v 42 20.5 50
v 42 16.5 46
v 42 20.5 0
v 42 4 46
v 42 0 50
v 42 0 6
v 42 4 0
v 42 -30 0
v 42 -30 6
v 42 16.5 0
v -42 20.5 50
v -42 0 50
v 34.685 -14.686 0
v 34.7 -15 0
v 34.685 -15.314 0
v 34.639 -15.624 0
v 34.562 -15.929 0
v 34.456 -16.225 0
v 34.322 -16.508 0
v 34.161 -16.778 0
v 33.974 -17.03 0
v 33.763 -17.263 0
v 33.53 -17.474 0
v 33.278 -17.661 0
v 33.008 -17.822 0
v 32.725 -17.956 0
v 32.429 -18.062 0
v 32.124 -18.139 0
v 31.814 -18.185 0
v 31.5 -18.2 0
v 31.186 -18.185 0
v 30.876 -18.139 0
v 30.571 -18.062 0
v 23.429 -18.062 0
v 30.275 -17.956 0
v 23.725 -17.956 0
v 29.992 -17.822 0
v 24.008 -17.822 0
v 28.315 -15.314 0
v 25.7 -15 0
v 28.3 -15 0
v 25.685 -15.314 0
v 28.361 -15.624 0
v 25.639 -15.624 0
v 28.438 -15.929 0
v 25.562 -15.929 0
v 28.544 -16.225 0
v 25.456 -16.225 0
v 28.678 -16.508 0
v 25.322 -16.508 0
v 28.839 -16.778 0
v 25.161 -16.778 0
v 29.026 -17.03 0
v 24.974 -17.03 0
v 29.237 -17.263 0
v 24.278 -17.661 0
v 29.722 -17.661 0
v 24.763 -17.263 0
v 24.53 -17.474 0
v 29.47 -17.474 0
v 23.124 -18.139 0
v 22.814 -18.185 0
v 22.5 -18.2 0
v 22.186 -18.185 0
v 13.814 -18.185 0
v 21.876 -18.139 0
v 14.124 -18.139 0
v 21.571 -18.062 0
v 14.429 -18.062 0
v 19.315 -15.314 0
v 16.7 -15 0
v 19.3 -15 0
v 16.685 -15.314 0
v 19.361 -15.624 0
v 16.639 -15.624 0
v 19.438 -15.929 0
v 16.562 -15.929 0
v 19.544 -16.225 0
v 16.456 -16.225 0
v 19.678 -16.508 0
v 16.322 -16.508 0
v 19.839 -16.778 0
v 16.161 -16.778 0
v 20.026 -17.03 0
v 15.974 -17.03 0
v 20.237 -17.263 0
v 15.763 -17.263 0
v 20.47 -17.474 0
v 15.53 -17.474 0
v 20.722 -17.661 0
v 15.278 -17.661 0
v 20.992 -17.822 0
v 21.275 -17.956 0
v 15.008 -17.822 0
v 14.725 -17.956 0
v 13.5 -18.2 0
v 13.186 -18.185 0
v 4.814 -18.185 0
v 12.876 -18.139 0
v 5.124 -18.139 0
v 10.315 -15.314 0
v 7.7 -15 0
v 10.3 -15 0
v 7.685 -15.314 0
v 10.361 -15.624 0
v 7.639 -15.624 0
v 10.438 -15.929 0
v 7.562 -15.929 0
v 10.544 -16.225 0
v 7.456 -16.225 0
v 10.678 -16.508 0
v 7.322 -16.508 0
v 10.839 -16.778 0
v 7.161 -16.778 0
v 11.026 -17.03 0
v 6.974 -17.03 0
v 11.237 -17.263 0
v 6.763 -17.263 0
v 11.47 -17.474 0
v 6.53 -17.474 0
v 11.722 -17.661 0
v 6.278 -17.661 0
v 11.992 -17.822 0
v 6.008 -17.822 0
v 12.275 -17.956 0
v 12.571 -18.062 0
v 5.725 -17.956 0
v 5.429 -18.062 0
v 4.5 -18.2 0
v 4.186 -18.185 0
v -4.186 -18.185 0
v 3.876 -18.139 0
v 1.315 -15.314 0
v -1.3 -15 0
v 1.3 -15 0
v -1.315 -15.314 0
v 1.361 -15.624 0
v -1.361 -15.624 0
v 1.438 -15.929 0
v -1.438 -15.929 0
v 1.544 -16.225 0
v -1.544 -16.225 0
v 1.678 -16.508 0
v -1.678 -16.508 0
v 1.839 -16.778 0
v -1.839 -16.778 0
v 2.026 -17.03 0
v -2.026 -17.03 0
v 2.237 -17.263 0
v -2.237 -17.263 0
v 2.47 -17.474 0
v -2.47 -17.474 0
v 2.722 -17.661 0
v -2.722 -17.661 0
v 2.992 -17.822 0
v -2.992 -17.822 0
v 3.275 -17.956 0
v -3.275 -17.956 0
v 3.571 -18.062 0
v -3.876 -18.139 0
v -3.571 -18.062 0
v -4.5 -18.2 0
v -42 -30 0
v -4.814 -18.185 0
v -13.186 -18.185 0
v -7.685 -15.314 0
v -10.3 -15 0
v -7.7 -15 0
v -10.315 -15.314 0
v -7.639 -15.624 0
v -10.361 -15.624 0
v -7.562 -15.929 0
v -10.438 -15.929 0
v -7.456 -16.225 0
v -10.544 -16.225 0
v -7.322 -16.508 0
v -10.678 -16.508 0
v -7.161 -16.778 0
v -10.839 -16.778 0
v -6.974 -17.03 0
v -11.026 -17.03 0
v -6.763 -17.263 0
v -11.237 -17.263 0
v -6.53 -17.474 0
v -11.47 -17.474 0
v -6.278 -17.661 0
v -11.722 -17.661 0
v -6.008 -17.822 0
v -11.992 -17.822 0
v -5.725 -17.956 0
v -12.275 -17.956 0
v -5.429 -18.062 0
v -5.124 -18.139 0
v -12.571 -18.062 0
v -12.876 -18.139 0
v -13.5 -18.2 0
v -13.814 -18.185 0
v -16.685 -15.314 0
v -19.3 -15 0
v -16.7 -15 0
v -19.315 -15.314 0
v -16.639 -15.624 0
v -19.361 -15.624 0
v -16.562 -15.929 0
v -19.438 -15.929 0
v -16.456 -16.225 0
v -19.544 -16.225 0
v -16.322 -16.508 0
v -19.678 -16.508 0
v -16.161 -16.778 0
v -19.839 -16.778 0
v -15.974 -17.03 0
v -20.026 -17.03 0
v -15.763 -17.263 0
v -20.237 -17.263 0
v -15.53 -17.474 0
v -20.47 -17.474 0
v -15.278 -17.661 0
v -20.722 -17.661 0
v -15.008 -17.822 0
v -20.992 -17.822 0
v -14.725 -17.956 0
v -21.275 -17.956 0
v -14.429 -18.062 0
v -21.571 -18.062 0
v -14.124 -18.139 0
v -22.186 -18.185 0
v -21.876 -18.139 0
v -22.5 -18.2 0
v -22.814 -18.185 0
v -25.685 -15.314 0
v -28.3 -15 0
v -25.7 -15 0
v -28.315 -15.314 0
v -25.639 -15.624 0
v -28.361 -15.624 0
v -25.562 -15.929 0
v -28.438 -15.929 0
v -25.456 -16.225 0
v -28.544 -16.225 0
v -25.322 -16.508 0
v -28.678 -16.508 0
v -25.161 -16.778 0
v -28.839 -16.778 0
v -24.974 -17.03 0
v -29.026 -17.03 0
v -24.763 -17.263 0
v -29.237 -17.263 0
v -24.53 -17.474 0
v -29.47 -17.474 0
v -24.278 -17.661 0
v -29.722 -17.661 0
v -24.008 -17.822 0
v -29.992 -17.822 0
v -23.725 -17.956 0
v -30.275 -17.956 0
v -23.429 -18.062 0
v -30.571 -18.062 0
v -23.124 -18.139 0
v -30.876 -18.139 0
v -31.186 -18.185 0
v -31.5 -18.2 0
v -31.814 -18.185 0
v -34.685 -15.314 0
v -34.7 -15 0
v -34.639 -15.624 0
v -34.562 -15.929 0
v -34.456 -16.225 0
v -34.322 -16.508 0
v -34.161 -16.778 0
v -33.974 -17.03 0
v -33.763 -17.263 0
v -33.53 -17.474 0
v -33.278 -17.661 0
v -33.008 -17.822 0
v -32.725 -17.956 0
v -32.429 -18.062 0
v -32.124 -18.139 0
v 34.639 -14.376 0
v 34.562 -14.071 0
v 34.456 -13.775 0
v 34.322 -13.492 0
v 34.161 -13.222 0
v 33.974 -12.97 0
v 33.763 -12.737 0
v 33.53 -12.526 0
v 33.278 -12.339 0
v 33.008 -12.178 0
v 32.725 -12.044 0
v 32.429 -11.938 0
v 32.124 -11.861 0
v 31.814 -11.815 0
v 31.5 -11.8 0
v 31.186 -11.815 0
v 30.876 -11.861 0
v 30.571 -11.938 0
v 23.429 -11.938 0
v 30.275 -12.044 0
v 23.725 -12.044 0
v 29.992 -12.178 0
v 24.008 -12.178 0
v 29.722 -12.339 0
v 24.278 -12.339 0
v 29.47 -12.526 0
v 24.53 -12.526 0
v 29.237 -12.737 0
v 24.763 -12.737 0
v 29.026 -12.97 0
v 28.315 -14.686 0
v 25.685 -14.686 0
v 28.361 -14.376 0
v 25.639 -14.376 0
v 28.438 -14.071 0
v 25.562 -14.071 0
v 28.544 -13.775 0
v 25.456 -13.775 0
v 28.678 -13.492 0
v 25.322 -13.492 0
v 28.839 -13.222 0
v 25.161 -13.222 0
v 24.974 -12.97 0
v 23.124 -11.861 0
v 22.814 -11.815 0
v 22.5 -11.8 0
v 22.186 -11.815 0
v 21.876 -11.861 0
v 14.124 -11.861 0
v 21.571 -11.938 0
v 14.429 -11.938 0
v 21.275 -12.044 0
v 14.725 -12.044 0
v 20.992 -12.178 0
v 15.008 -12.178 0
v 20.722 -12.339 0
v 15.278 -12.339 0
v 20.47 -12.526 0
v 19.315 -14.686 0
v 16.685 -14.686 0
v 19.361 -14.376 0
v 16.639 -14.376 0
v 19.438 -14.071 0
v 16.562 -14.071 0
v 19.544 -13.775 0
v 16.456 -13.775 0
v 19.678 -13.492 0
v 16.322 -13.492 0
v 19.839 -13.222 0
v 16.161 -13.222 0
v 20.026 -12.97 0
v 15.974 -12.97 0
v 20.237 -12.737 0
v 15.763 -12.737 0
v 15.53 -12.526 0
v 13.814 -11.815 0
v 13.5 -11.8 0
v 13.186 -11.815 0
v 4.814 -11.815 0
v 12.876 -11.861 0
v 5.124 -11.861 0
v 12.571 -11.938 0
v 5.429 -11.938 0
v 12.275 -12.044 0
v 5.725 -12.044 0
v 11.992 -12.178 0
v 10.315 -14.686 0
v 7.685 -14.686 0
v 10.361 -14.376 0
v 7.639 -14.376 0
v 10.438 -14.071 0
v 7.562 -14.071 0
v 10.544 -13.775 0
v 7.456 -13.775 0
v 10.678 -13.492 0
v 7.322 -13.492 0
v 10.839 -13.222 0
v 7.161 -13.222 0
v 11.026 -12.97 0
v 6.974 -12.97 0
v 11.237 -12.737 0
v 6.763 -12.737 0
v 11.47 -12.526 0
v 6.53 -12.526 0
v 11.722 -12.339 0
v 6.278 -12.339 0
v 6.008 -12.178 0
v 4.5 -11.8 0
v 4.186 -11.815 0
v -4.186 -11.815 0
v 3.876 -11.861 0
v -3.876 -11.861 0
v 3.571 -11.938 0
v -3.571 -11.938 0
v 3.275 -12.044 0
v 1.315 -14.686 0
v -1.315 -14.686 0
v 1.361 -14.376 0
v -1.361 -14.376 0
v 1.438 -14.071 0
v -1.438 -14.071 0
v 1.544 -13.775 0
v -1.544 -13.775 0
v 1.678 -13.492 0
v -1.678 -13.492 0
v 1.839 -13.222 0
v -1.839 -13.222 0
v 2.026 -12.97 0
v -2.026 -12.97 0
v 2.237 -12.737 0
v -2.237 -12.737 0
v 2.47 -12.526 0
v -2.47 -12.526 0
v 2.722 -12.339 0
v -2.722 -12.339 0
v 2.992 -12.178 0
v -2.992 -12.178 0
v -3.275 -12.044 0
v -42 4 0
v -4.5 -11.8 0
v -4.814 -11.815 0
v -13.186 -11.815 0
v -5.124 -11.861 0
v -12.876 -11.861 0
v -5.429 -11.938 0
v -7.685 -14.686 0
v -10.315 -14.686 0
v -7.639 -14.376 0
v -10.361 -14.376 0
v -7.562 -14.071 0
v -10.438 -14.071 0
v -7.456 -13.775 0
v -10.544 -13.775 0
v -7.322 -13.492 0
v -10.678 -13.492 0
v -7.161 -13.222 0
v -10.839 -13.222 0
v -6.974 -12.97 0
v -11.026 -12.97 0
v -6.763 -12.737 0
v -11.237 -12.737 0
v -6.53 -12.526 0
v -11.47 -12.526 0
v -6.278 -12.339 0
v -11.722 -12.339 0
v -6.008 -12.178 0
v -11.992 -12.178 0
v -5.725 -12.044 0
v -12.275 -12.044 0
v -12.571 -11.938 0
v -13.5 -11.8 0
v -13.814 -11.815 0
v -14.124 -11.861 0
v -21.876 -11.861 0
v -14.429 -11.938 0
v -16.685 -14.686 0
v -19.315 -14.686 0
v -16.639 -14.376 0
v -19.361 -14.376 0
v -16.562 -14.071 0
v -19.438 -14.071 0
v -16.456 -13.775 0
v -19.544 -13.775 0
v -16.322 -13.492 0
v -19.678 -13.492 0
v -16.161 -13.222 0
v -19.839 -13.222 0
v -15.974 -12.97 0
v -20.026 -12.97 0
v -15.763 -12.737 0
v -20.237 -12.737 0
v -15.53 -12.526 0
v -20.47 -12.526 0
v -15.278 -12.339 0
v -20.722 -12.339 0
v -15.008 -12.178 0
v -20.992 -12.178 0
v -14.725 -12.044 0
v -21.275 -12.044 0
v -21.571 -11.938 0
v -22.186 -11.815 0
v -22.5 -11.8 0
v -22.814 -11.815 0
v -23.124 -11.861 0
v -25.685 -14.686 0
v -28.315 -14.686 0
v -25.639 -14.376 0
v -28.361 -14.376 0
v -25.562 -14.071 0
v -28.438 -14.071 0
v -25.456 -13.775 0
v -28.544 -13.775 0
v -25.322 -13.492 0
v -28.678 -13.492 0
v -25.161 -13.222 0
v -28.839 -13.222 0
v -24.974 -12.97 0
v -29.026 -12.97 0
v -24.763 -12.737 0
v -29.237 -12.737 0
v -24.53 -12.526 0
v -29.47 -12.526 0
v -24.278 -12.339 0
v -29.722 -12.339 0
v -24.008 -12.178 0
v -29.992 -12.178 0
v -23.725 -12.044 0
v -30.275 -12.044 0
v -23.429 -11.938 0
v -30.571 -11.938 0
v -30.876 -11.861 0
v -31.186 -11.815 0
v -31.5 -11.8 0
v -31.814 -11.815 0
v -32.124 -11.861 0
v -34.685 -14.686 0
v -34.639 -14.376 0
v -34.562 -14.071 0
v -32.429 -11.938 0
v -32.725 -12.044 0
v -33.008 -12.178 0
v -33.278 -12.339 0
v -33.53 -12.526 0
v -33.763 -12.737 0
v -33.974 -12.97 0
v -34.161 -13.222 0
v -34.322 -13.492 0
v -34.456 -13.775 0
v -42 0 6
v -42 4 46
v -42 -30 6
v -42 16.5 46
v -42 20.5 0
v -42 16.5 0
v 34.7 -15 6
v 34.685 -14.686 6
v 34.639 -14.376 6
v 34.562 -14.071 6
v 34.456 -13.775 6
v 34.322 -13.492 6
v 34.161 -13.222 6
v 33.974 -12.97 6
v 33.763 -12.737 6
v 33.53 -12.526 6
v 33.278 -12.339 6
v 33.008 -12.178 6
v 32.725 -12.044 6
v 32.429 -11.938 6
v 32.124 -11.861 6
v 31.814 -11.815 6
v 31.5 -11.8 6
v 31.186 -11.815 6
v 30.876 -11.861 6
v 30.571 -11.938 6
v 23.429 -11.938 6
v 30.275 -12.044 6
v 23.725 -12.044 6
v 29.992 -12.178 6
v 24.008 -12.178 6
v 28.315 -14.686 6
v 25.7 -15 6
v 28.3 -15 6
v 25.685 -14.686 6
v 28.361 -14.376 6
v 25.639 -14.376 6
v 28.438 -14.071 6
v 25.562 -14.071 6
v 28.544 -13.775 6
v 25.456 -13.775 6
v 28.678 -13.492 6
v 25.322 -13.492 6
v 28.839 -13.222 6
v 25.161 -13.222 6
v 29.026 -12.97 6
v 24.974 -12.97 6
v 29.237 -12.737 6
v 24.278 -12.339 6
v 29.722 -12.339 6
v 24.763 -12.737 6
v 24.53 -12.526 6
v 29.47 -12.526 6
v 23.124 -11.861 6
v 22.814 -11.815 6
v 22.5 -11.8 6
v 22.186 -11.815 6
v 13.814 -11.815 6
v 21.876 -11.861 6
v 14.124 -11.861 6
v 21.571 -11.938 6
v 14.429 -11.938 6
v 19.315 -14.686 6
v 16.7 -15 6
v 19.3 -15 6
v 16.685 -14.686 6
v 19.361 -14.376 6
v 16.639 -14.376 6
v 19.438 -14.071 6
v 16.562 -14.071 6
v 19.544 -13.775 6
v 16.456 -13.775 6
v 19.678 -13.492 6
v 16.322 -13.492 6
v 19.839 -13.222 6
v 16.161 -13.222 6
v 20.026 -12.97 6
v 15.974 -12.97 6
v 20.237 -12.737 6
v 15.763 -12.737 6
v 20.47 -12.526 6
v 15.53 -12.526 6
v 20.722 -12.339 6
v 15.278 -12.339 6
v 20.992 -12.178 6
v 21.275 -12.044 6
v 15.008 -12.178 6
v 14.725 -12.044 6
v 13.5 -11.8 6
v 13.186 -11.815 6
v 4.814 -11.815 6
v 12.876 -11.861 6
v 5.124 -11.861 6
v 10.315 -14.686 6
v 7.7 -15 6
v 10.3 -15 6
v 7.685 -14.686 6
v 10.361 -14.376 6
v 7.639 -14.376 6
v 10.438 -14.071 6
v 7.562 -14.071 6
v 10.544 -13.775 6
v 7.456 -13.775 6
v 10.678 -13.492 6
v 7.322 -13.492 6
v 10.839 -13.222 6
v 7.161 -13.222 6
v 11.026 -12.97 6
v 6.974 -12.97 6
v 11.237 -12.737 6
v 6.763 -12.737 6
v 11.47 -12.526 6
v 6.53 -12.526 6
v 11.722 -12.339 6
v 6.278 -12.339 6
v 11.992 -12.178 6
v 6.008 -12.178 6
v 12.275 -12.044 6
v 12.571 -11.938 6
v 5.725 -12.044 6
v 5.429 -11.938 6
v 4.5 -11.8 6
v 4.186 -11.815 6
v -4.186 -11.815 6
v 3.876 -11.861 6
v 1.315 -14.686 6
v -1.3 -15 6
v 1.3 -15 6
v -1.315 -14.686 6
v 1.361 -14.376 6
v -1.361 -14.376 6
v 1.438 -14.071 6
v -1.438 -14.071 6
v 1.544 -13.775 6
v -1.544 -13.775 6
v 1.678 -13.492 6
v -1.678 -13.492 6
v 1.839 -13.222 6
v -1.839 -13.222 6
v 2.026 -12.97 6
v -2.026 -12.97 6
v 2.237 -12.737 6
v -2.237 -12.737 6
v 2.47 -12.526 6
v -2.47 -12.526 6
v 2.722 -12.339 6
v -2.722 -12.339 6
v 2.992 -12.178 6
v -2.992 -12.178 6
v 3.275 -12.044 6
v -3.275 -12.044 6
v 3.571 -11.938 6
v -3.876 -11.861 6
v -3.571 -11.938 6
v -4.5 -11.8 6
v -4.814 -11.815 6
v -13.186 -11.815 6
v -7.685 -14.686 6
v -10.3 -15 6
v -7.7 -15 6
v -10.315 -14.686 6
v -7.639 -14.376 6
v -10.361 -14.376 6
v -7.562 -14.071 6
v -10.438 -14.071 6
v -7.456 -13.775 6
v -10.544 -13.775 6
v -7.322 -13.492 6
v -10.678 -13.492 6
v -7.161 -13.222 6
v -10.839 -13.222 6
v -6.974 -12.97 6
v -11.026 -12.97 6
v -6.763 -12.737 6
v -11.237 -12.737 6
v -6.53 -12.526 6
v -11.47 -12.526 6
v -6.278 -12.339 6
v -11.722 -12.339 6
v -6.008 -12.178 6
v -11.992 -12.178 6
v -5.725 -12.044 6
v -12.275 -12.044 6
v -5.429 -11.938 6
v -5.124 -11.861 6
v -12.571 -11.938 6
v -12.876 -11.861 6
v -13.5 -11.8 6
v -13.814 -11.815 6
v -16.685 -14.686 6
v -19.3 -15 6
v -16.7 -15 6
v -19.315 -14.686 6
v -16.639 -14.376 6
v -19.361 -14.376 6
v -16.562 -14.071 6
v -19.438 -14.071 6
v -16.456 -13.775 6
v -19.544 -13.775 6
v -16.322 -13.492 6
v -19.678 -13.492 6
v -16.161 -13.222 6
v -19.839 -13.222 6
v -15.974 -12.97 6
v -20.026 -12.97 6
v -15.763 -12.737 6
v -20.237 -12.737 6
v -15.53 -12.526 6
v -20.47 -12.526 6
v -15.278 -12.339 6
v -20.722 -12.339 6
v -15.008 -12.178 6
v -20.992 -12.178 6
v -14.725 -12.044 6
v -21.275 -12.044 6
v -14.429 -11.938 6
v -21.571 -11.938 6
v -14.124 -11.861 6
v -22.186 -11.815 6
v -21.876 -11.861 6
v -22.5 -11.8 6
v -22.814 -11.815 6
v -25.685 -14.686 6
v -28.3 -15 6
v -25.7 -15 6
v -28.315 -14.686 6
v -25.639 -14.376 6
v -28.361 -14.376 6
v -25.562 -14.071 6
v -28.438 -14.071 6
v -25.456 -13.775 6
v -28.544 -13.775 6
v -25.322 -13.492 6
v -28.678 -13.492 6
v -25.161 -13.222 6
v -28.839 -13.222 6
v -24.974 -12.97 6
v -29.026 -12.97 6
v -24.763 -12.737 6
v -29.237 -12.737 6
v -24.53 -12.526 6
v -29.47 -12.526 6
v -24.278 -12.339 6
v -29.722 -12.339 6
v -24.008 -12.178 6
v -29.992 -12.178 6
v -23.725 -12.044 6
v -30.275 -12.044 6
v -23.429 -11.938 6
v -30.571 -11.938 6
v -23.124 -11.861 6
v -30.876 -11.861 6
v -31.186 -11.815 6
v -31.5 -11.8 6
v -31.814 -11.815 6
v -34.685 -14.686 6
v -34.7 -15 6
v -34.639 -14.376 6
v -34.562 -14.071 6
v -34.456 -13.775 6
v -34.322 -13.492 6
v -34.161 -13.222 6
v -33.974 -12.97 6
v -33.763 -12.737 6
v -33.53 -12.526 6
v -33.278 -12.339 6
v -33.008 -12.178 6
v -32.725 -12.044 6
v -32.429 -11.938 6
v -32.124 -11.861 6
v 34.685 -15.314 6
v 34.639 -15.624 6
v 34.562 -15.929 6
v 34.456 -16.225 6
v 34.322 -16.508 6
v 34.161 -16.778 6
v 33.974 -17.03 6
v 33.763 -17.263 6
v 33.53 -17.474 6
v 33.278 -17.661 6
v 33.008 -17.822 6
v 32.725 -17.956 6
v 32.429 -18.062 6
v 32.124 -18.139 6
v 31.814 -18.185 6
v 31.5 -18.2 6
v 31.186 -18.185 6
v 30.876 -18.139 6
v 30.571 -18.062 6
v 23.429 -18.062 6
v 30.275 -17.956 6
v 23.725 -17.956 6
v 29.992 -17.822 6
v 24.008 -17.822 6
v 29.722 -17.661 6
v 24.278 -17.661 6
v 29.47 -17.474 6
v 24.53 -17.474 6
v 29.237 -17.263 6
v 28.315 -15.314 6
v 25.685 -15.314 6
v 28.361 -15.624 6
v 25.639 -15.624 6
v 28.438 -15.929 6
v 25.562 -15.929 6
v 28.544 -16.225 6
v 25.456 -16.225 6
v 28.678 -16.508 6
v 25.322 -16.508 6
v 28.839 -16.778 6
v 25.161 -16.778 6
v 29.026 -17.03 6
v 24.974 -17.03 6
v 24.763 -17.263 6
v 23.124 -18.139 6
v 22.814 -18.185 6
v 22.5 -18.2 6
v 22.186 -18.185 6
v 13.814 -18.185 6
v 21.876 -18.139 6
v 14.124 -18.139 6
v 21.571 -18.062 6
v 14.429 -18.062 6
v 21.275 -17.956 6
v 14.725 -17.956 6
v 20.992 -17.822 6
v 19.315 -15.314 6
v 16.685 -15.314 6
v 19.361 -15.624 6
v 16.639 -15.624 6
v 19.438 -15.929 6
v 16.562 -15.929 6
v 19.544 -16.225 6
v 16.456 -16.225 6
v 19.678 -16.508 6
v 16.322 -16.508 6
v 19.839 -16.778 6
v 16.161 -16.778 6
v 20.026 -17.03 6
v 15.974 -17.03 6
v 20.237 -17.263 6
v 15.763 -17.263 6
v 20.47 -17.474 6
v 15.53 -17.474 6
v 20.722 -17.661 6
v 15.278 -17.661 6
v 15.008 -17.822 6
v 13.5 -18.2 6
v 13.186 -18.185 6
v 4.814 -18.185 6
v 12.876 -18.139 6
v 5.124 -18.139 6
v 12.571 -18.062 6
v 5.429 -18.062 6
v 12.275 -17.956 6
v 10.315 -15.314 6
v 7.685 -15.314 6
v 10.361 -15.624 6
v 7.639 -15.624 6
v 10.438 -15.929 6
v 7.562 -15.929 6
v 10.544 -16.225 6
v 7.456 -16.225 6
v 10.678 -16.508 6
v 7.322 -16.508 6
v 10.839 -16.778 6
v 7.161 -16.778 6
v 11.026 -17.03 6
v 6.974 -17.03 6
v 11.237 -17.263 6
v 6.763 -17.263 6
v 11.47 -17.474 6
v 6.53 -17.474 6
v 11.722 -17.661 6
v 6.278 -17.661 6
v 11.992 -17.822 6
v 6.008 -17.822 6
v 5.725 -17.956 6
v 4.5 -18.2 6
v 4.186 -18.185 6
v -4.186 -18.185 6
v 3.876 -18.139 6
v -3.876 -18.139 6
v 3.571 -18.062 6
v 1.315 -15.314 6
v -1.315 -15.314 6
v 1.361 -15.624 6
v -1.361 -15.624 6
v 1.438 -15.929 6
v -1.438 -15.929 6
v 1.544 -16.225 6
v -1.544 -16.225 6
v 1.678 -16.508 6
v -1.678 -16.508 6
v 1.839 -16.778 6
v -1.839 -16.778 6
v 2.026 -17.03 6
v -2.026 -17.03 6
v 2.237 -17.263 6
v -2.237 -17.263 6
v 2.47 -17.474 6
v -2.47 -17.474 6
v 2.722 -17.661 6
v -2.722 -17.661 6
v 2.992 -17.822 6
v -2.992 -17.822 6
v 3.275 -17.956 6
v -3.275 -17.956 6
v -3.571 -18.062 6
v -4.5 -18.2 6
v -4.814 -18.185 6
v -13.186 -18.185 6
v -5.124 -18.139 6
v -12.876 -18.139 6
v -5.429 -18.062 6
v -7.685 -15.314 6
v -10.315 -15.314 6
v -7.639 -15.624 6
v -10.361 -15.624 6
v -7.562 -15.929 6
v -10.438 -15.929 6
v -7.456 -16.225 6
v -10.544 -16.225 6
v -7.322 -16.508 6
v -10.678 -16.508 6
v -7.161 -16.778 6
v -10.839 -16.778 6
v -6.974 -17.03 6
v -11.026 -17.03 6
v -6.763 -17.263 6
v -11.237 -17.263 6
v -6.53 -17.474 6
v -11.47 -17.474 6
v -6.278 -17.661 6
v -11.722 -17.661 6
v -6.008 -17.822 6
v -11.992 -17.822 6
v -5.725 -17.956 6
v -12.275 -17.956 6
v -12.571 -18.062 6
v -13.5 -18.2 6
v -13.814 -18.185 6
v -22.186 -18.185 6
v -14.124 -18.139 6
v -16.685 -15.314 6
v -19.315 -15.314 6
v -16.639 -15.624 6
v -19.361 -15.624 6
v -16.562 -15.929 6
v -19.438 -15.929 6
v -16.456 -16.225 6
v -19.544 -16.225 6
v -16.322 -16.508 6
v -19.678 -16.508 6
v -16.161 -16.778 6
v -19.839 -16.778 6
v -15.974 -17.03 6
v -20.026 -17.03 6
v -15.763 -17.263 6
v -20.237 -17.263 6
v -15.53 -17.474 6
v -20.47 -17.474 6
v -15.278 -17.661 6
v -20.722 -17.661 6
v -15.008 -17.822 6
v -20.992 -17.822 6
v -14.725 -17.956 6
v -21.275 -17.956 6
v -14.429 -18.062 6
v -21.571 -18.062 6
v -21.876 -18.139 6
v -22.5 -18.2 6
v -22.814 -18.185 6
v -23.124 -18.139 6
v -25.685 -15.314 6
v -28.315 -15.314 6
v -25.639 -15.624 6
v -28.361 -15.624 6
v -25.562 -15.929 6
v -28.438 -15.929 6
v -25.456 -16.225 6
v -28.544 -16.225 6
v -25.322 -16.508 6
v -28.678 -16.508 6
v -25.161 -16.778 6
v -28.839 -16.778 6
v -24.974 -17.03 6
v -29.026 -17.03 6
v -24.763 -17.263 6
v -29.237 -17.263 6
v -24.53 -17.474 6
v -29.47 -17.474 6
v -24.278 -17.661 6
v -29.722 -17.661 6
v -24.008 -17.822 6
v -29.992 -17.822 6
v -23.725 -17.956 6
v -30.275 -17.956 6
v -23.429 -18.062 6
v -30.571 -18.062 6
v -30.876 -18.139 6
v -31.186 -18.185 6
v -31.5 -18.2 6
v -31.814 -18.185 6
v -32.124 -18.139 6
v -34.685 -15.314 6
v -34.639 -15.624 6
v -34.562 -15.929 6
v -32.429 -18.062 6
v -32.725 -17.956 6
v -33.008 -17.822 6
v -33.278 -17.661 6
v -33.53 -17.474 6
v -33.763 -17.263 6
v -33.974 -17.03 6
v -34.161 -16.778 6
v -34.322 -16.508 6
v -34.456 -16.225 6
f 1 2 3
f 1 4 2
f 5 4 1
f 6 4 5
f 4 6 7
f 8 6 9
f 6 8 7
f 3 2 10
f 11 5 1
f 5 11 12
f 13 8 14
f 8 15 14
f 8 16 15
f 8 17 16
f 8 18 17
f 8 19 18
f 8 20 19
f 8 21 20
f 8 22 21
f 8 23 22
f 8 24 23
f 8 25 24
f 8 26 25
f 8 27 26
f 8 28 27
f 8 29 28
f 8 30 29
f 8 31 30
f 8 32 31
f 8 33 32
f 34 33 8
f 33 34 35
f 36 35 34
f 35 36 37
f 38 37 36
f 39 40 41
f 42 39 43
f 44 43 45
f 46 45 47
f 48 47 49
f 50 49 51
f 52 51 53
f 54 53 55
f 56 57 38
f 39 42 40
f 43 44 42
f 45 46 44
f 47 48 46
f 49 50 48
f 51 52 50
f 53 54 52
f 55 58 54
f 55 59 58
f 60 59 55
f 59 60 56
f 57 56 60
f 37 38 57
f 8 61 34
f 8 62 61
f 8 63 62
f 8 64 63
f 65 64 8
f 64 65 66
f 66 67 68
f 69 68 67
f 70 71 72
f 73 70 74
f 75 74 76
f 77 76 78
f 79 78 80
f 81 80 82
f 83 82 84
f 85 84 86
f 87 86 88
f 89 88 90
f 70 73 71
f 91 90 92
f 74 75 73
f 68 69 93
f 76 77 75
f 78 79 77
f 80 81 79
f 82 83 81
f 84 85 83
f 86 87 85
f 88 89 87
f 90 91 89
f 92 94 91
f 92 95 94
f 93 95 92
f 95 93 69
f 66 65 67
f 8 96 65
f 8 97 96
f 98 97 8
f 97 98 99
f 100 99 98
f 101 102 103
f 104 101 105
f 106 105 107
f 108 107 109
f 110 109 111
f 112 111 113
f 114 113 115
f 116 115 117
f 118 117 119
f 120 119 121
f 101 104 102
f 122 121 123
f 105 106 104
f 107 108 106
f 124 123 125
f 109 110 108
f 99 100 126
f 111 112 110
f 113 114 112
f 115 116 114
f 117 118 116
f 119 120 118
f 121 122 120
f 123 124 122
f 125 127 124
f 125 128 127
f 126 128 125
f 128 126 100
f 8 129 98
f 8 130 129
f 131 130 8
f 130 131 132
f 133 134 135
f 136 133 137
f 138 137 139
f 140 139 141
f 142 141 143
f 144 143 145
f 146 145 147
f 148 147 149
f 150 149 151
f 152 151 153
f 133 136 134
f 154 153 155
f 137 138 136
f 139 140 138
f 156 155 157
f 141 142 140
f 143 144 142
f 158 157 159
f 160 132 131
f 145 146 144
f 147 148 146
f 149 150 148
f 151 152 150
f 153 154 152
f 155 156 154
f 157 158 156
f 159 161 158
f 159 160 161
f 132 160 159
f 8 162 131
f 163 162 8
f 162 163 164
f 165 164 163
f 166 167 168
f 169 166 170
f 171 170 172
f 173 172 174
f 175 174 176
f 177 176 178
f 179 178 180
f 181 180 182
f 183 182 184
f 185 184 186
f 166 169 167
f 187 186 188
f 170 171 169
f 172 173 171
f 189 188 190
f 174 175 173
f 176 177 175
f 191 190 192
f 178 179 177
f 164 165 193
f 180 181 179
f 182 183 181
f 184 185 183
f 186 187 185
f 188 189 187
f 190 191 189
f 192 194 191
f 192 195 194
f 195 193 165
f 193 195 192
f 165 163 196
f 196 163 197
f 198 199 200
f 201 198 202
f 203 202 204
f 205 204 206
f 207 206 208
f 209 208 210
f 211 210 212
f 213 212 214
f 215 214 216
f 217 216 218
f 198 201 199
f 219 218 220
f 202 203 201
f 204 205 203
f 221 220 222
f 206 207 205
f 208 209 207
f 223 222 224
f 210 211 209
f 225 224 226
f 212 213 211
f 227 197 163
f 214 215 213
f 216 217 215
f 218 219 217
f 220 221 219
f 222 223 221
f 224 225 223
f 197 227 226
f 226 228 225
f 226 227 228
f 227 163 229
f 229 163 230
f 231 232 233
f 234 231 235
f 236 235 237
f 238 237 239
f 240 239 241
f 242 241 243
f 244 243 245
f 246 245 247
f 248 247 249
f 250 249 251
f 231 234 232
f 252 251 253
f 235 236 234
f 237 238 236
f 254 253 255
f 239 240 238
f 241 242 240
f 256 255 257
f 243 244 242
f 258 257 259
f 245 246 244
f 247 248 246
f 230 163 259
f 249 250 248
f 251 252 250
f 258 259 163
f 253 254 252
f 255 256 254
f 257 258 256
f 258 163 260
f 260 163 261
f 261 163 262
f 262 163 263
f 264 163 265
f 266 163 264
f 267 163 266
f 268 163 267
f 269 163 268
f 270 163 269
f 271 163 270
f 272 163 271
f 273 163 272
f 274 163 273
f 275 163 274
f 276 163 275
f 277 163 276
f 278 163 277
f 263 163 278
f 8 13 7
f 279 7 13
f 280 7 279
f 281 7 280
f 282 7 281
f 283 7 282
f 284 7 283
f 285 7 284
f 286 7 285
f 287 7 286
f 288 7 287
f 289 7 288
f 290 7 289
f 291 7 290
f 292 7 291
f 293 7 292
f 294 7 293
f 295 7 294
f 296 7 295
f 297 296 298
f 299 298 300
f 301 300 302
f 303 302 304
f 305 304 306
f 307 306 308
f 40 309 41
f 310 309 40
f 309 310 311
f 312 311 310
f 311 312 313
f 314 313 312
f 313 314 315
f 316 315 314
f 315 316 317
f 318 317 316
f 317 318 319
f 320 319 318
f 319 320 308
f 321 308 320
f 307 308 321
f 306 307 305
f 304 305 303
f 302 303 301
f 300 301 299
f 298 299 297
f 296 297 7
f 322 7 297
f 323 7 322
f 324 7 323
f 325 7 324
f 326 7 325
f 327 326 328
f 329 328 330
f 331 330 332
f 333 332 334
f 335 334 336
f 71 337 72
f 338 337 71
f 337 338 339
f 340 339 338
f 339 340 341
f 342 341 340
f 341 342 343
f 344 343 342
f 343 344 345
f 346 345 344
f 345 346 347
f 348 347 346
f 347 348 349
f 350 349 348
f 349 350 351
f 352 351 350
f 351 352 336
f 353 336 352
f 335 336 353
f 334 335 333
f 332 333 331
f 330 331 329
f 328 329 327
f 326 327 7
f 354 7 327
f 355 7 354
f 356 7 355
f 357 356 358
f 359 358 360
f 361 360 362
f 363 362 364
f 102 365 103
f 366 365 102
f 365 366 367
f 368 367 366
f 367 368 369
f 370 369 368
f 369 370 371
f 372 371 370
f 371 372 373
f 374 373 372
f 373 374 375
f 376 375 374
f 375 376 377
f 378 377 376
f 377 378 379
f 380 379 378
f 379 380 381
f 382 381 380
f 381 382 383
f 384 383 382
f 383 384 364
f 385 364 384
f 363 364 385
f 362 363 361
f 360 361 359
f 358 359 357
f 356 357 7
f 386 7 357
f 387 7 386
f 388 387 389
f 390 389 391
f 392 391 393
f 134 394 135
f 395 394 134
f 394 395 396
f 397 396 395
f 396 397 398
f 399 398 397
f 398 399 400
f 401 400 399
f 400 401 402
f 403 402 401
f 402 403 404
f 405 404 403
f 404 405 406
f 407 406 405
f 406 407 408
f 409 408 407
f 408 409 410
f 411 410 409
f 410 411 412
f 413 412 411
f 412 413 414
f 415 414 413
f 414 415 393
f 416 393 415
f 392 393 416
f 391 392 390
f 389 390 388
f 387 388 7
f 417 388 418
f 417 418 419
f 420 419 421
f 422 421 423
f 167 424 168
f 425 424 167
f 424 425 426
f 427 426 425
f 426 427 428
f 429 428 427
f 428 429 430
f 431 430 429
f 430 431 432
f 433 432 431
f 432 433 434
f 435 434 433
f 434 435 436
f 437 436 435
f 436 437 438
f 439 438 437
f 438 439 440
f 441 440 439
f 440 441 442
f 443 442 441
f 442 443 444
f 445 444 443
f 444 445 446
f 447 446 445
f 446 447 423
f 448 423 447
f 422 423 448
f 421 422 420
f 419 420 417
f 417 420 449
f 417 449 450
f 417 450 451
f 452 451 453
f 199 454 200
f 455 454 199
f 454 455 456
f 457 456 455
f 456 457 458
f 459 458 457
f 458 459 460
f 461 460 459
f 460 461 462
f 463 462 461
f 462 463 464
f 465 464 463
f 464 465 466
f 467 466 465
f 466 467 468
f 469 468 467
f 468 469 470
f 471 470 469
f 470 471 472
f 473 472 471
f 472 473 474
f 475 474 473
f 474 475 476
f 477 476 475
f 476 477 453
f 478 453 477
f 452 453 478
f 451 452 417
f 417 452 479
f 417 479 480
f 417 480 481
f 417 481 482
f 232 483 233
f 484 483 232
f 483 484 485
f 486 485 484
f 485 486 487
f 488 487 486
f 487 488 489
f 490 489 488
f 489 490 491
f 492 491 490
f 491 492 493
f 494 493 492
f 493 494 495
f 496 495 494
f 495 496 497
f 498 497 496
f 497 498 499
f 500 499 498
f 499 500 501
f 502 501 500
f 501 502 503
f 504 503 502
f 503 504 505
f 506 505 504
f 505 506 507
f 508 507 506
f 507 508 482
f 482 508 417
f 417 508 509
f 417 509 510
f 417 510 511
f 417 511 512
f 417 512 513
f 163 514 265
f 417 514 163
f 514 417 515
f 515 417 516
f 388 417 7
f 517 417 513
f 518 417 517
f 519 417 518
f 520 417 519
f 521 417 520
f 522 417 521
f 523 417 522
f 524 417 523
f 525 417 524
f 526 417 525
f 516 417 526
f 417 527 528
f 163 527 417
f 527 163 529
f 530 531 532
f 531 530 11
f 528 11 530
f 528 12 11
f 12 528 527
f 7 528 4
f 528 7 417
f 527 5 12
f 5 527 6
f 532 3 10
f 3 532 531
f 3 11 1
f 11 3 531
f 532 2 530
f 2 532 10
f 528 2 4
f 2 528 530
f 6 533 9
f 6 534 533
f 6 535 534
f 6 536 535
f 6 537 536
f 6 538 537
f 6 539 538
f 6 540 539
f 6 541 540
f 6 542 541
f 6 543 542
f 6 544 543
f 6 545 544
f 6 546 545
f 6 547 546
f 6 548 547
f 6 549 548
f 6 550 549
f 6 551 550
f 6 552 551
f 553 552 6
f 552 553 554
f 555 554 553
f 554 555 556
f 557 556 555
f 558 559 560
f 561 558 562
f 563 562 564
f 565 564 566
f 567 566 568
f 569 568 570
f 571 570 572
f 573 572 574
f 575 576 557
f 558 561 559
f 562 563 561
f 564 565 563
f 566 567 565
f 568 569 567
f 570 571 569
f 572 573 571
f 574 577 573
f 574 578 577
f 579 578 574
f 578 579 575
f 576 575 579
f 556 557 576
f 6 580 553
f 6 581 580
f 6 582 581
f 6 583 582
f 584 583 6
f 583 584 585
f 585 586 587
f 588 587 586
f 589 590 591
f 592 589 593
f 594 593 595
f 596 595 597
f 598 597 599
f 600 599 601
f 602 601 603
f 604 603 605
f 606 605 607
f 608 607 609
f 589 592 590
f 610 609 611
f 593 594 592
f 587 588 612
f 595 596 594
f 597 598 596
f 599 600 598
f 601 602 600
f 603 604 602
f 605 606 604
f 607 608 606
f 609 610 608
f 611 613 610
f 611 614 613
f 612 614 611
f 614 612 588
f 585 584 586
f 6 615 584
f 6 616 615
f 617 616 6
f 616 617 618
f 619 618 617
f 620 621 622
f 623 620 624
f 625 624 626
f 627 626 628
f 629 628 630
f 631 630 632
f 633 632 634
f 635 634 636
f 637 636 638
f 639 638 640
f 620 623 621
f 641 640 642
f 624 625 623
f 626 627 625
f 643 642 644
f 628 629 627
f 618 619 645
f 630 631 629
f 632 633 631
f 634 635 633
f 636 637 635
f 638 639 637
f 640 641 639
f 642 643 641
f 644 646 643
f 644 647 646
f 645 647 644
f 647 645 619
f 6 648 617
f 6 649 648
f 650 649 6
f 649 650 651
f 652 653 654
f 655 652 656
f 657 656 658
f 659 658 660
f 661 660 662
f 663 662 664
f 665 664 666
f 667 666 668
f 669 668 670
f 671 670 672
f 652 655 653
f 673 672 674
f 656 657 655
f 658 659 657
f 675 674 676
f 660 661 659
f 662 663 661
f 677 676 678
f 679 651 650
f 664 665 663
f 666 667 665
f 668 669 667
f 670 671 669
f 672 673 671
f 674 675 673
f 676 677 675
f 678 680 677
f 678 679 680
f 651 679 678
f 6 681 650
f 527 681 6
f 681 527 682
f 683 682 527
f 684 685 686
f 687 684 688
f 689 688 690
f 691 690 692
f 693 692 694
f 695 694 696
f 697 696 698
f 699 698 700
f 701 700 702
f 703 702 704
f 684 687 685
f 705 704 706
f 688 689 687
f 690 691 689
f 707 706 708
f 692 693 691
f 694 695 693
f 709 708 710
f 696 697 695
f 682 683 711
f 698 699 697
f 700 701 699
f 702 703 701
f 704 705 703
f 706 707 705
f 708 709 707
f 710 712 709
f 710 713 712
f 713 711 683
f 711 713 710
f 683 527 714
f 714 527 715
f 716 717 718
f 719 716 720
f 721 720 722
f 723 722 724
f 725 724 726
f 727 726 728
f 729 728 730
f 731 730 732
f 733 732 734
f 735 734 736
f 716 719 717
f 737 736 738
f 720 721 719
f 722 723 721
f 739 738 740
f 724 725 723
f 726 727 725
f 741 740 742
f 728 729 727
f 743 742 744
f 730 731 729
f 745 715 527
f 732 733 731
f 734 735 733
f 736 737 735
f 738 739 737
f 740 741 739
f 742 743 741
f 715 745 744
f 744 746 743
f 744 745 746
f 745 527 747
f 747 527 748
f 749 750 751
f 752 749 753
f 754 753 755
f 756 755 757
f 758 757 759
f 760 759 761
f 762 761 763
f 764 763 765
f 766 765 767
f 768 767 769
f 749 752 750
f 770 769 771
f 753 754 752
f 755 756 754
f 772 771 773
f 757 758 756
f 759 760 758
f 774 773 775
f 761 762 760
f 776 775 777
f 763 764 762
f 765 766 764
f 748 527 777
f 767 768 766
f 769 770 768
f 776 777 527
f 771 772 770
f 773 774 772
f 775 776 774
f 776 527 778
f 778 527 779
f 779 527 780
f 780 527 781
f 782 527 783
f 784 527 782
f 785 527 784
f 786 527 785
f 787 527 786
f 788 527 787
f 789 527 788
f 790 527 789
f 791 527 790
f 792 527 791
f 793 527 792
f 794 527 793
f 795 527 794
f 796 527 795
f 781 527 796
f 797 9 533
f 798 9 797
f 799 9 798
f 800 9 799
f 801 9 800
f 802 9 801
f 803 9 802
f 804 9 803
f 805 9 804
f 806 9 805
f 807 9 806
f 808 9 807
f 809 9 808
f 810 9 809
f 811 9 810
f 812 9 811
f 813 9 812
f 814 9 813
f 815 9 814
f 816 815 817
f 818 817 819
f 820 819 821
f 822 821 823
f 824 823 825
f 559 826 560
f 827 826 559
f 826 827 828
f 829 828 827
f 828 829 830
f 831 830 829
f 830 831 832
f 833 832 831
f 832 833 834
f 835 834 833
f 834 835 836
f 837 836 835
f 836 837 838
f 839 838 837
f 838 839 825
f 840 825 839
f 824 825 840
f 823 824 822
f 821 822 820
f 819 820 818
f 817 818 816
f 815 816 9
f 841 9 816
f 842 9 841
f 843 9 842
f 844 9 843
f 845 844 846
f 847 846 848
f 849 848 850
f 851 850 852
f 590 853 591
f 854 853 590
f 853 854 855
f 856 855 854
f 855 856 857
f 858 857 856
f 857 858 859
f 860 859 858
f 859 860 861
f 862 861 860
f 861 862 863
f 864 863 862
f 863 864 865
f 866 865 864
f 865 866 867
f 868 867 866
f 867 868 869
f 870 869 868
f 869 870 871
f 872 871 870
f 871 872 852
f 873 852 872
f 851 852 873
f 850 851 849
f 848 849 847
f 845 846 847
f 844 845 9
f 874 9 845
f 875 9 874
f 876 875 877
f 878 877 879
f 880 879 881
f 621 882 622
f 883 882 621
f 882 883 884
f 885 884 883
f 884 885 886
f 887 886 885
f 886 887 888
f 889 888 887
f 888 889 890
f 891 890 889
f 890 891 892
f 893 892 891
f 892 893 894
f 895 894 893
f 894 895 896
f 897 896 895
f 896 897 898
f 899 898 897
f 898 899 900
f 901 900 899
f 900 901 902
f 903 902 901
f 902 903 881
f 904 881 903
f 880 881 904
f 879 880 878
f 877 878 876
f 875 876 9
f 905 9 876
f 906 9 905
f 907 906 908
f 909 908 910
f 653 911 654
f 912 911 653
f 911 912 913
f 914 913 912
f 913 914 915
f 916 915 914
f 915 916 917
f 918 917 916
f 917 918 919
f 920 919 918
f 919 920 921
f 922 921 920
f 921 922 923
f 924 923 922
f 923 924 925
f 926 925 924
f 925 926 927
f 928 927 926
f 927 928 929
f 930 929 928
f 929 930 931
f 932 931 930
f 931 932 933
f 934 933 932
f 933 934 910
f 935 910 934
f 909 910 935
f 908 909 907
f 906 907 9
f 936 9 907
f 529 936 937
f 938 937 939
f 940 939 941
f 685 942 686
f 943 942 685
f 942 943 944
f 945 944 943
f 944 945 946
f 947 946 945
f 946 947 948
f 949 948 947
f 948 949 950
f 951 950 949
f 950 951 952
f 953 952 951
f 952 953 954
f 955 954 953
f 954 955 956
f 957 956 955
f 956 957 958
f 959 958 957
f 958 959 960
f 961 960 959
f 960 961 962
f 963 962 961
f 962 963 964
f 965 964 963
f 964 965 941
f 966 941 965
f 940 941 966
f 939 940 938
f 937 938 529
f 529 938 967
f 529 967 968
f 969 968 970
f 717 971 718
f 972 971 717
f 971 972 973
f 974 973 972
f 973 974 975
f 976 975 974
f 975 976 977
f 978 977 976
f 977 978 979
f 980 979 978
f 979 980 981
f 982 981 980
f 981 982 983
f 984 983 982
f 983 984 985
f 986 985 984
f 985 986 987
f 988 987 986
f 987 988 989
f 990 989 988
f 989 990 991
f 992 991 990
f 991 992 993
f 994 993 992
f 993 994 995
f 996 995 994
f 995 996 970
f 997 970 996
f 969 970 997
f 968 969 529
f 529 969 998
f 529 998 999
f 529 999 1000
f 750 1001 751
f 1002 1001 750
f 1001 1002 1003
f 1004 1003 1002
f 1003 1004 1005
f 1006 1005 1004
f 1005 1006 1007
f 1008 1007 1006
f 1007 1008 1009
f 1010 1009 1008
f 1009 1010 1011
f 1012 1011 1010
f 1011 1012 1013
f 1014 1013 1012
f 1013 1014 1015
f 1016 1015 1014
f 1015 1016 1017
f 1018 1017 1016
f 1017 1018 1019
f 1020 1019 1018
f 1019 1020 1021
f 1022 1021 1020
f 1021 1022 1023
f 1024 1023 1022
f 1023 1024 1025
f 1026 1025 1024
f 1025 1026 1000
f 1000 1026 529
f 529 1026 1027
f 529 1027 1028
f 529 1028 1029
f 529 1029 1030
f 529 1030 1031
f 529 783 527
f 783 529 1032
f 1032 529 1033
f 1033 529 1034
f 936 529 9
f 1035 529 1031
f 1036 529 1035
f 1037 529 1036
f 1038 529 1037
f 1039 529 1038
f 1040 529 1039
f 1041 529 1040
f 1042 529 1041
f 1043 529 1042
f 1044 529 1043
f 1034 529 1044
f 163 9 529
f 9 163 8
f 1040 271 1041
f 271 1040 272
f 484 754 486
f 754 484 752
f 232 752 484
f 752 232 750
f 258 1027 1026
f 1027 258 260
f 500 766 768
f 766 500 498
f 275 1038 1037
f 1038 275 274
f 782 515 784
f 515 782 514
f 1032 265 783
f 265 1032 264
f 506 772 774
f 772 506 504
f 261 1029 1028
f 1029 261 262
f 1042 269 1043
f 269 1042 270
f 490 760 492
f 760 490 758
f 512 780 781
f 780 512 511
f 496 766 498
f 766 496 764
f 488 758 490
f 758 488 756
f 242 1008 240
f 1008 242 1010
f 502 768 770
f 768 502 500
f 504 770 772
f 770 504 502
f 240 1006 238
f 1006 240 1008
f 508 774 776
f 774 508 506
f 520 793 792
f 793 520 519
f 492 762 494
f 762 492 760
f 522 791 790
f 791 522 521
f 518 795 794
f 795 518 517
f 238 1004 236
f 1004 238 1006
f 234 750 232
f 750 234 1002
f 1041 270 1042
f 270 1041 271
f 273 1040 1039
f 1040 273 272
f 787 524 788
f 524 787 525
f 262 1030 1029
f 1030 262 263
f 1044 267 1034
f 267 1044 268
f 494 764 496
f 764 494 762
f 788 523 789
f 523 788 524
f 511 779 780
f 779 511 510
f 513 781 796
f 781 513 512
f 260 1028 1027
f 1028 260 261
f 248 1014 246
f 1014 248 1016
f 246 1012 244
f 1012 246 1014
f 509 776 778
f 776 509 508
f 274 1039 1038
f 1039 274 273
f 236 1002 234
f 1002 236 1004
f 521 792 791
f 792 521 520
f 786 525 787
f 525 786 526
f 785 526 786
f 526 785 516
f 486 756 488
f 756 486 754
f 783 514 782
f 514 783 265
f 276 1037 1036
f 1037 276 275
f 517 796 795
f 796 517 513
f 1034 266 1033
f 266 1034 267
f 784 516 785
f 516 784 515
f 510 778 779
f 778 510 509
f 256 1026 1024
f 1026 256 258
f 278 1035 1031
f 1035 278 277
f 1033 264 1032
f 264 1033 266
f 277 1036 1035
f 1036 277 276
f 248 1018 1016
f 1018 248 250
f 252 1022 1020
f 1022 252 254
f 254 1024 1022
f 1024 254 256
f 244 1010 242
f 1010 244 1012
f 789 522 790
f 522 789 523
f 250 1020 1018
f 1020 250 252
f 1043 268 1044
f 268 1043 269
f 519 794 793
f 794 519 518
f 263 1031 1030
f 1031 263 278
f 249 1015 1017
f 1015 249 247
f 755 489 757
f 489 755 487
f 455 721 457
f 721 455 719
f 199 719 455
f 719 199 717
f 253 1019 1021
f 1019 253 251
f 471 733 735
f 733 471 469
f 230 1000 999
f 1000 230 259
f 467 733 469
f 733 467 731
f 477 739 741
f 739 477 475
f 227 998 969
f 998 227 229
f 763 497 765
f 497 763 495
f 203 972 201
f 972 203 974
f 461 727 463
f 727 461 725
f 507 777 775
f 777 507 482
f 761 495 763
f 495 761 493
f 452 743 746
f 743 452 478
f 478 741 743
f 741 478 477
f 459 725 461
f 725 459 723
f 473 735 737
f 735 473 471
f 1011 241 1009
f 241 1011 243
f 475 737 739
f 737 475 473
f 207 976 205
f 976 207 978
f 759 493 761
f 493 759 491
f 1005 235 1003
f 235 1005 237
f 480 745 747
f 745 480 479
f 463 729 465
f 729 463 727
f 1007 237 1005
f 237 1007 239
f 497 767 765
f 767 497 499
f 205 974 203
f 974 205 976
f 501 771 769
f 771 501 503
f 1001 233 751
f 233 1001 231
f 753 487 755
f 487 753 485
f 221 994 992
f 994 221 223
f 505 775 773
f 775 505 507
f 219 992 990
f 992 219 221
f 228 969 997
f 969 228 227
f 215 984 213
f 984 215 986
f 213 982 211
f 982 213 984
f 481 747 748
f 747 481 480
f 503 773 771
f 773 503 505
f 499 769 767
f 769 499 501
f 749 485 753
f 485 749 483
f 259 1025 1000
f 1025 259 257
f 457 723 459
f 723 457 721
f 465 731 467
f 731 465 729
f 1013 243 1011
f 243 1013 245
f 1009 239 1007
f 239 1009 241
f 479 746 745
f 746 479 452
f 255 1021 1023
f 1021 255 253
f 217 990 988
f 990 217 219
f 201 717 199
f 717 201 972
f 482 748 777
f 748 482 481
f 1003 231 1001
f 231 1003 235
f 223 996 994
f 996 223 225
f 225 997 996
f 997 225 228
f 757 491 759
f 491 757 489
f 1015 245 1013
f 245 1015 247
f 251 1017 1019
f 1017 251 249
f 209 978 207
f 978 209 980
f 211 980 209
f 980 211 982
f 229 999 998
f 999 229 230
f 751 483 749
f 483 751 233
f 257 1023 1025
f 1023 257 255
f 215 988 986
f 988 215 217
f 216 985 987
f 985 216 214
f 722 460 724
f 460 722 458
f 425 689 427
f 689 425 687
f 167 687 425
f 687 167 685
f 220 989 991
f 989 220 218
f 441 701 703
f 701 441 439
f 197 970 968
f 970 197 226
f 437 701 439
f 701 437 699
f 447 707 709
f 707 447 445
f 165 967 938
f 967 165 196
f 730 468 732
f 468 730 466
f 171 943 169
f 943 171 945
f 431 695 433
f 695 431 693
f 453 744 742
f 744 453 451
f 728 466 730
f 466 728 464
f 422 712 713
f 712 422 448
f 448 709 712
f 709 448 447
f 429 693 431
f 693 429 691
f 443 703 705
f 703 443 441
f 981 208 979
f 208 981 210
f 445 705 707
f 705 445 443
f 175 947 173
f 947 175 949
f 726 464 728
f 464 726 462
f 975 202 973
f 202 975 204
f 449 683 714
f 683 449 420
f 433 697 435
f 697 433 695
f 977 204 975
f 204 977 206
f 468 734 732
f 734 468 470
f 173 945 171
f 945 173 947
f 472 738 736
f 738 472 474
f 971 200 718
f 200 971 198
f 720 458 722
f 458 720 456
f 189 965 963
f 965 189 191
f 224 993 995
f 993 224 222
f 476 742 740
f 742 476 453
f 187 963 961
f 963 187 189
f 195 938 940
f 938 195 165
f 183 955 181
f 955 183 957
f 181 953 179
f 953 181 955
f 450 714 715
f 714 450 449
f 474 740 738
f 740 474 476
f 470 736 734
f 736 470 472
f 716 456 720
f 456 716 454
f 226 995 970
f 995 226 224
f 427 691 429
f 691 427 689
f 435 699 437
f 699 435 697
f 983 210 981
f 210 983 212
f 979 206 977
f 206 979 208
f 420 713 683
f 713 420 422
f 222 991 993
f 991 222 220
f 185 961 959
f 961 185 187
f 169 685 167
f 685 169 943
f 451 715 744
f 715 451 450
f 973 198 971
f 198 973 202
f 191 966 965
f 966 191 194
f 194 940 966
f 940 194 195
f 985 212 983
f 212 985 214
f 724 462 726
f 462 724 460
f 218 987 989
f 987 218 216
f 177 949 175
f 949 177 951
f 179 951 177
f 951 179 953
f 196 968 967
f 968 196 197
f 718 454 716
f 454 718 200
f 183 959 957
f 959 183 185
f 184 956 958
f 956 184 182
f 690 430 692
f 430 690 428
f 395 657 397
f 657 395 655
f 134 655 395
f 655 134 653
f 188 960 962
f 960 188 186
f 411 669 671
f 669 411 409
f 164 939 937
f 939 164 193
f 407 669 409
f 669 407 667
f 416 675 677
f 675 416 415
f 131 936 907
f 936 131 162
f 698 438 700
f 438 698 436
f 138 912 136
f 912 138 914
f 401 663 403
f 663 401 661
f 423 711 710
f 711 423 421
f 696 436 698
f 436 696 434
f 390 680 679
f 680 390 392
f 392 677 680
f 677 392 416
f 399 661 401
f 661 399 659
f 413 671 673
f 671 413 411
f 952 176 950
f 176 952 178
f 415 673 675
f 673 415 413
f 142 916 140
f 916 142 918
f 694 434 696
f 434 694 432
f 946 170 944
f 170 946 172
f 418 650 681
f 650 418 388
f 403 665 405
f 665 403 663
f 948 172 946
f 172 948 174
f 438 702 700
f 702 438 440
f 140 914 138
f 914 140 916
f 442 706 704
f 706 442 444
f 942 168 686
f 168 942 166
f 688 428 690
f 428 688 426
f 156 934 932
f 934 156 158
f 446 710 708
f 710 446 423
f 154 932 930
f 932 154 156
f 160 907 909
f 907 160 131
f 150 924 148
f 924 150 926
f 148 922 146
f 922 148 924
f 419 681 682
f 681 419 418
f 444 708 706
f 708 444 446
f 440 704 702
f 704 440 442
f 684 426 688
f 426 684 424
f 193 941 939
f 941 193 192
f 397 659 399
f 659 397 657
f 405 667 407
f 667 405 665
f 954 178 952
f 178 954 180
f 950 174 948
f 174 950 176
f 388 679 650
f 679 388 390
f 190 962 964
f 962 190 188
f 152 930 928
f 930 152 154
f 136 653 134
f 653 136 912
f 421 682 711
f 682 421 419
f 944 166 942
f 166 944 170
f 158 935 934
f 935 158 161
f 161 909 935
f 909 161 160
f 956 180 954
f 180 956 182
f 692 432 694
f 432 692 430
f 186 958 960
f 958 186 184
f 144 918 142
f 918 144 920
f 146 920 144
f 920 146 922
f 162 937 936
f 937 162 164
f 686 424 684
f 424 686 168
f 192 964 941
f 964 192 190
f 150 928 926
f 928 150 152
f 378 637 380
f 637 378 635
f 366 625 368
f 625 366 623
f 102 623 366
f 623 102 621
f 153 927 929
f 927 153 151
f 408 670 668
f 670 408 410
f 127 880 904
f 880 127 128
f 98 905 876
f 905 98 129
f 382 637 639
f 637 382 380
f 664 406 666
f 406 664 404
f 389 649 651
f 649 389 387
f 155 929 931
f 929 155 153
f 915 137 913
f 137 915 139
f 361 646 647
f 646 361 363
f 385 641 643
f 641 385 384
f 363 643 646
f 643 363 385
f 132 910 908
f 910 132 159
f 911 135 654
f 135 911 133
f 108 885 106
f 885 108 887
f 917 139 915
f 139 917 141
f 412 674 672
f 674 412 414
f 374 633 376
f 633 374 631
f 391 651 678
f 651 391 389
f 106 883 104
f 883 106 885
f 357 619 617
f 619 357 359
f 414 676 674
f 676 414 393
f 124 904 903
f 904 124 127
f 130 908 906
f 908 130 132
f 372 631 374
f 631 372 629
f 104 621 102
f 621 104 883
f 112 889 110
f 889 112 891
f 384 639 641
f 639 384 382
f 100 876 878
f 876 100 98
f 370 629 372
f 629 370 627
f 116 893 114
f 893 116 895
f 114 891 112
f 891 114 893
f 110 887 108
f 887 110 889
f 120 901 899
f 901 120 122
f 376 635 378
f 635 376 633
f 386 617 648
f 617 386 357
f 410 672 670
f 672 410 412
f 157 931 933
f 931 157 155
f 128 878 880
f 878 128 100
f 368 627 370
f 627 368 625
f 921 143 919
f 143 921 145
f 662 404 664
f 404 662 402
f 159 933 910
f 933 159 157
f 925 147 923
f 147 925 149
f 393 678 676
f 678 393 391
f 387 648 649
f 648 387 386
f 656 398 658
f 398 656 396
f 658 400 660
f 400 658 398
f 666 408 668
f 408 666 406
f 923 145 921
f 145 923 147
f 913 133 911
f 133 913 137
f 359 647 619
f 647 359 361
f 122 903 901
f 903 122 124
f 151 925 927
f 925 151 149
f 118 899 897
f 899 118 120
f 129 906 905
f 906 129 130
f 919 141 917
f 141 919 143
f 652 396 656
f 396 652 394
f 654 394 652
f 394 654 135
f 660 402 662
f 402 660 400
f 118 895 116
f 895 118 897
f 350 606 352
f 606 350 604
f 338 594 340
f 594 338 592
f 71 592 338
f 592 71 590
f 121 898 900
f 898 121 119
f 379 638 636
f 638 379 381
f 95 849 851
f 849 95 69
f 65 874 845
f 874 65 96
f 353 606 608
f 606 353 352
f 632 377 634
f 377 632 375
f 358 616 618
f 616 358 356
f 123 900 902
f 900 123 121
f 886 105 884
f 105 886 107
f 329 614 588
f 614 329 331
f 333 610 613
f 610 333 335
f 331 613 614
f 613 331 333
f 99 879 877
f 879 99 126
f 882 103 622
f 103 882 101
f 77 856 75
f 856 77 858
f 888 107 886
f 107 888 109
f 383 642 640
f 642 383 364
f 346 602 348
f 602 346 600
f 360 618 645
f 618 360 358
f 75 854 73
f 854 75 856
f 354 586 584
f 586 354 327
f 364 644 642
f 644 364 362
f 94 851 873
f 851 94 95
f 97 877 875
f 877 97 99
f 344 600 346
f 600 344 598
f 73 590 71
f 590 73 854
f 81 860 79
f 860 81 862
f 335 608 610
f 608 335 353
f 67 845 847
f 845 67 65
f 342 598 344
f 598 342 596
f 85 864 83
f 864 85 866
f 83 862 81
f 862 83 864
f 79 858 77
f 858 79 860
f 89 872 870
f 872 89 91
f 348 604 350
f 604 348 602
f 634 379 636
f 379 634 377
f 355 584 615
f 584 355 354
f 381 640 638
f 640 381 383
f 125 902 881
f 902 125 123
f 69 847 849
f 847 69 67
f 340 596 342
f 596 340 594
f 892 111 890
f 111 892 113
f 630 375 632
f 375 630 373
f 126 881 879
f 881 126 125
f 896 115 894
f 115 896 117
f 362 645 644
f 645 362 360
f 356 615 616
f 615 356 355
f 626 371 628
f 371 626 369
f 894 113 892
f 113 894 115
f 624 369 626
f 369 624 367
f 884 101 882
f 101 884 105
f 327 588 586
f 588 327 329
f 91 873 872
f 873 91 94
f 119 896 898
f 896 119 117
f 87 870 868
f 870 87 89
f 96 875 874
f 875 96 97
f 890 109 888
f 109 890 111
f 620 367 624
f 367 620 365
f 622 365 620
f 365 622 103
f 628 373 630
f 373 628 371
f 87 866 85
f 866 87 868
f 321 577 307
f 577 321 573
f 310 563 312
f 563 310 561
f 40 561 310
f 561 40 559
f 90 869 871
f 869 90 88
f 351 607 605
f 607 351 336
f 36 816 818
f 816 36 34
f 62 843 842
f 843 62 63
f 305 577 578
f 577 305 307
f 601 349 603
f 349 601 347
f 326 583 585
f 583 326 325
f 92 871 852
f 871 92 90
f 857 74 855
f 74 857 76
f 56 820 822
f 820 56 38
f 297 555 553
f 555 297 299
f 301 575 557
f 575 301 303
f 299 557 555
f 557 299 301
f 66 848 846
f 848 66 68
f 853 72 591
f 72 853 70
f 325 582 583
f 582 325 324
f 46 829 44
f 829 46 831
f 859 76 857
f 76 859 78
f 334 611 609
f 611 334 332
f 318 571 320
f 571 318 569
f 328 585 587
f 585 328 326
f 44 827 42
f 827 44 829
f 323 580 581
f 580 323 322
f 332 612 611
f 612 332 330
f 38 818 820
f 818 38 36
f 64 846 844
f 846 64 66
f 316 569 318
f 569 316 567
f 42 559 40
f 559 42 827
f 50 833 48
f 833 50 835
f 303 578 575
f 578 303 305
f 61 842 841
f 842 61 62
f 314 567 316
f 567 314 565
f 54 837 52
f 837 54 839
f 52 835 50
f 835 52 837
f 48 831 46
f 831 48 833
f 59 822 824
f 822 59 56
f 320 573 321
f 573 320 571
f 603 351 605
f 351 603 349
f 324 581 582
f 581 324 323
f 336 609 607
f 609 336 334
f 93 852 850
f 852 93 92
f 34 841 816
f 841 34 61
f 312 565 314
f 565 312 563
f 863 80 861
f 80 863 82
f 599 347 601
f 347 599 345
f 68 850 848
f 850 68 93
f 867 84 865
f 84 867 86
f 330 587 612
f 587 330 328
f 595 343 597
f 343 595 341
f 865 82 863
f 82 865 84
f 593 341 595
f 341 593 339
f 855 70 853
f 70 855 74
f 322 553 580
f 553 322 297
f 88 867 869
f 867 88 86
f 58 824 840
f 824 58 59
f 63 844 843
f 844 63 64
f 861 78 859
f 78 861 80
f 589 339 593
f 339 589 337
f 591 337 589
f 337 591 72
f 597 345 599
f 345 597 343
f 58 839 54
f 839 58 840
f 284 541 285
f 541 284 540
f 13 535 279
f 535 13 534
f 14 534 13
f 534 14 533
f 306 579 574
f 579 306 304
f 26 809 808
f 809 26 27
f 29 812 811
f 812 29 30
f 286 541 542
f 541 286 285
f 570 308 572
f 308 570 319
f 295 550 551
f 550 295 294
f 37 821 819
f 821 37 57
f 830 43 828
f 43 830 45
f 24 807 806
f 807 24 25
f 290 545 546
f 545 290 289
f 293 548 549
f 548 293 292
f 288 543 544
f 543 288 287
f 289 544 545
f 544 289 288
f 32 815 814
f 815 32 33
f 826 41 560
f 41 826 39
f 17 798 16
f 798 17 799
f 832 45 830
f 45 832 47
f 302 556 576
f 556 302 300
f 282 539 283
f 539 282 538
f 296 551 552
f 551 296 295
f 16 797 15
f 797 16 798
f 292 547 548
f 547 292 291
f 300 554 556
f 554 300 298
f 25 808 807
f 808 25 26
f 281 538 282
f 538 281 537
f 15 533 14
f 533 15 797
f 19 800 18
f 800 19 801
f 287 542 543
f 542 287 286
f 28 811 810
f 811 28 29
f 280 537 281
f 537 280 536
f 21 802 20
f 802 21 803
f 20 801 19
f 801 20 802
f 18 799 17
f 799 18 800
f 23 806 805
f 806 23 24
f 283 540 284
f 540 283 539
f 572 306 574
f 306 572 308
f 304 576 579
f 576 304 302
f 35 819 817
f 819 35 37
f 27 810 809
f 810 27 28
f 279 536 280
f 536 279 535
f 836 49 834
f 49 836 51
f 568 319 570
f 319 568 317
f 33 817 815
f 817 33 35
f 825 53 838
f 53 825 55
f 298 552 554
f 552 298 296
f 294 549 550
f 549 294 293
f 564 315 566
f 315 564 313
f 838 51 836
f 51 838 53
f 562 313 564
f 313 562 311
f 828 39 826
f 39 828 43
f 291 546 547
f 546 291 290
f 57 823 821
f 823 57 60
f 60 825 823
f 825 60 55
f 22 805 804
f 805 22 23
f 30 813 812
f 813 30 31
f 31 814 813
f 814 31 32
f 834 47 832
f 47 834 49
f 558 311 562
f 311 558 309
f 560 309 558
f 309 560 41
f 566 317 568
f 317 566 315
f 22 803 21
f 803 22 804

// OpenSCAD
// PCR 8-strip holder that hooks over a 12 mm ice-bucket wall
// Printed as used: profile in YZ, extruded along X, centred on x = 0

$fn = 64;

// ---- Overall ----
length        = 84;     // extrusion length along X

// ---- Hook (upside-down U) ----
leg_t         = 4;      // thickness of each leg (Y)
inner_leg_y0  = 0;      // inner leg start (Y)
outer_leg_y0  = 16.5;   // outer leg start (Y) -> 12.5 mm wall gap
hook_h        = 50;     // leg height (Z)
bridge_t      = 4;      // bridge thickness (z = 46..50)

// ---- Ledge ----
ledge_t       = 6;      // ledge thickness (z = 0..6)
ledge_reach   = 30;     // ledge extends from y = 0 to y = -30

// ---- Tube holes ----
hole_d        = 6.4;    // through-hole diameter
hole_n        = 8;      // number of tubes
hole_pitch    = 9;      // spacing along X
hole_y        = -15;    // hole centre Y

eps           = 0.5;    // cutter overshoot

difference() {
    union() {
        // inner leg
        translate([-length/2, inner_leg_y0, 0])
            cube([length, leg_t, hook_h]);
        // outer leg
        translate([-length/2, outer_leg_y0, 0])
            cube([length, leg_t, hook_h]);
        // bridge
        translate([-length/2, inner_leg_y0, hook_h - bridge_t])
            cube([length, outer_leg_y0 + leg_t - inner_leg_y0, bridge_t]);
        // ledge
        translate([-length/2, -ledge_reach, 0])
            cube([length, ledge_reach + leg_t, ledge_t]);
    }
    // tube holes
    for (i = [0 : hole_n - 1])
        translate([(i - (hole_n - 1) / 2) * hole_pitch, hole_y, -eps])
            cylinder(d = hole_d, h = ledge_t + 2 * eps);
}
